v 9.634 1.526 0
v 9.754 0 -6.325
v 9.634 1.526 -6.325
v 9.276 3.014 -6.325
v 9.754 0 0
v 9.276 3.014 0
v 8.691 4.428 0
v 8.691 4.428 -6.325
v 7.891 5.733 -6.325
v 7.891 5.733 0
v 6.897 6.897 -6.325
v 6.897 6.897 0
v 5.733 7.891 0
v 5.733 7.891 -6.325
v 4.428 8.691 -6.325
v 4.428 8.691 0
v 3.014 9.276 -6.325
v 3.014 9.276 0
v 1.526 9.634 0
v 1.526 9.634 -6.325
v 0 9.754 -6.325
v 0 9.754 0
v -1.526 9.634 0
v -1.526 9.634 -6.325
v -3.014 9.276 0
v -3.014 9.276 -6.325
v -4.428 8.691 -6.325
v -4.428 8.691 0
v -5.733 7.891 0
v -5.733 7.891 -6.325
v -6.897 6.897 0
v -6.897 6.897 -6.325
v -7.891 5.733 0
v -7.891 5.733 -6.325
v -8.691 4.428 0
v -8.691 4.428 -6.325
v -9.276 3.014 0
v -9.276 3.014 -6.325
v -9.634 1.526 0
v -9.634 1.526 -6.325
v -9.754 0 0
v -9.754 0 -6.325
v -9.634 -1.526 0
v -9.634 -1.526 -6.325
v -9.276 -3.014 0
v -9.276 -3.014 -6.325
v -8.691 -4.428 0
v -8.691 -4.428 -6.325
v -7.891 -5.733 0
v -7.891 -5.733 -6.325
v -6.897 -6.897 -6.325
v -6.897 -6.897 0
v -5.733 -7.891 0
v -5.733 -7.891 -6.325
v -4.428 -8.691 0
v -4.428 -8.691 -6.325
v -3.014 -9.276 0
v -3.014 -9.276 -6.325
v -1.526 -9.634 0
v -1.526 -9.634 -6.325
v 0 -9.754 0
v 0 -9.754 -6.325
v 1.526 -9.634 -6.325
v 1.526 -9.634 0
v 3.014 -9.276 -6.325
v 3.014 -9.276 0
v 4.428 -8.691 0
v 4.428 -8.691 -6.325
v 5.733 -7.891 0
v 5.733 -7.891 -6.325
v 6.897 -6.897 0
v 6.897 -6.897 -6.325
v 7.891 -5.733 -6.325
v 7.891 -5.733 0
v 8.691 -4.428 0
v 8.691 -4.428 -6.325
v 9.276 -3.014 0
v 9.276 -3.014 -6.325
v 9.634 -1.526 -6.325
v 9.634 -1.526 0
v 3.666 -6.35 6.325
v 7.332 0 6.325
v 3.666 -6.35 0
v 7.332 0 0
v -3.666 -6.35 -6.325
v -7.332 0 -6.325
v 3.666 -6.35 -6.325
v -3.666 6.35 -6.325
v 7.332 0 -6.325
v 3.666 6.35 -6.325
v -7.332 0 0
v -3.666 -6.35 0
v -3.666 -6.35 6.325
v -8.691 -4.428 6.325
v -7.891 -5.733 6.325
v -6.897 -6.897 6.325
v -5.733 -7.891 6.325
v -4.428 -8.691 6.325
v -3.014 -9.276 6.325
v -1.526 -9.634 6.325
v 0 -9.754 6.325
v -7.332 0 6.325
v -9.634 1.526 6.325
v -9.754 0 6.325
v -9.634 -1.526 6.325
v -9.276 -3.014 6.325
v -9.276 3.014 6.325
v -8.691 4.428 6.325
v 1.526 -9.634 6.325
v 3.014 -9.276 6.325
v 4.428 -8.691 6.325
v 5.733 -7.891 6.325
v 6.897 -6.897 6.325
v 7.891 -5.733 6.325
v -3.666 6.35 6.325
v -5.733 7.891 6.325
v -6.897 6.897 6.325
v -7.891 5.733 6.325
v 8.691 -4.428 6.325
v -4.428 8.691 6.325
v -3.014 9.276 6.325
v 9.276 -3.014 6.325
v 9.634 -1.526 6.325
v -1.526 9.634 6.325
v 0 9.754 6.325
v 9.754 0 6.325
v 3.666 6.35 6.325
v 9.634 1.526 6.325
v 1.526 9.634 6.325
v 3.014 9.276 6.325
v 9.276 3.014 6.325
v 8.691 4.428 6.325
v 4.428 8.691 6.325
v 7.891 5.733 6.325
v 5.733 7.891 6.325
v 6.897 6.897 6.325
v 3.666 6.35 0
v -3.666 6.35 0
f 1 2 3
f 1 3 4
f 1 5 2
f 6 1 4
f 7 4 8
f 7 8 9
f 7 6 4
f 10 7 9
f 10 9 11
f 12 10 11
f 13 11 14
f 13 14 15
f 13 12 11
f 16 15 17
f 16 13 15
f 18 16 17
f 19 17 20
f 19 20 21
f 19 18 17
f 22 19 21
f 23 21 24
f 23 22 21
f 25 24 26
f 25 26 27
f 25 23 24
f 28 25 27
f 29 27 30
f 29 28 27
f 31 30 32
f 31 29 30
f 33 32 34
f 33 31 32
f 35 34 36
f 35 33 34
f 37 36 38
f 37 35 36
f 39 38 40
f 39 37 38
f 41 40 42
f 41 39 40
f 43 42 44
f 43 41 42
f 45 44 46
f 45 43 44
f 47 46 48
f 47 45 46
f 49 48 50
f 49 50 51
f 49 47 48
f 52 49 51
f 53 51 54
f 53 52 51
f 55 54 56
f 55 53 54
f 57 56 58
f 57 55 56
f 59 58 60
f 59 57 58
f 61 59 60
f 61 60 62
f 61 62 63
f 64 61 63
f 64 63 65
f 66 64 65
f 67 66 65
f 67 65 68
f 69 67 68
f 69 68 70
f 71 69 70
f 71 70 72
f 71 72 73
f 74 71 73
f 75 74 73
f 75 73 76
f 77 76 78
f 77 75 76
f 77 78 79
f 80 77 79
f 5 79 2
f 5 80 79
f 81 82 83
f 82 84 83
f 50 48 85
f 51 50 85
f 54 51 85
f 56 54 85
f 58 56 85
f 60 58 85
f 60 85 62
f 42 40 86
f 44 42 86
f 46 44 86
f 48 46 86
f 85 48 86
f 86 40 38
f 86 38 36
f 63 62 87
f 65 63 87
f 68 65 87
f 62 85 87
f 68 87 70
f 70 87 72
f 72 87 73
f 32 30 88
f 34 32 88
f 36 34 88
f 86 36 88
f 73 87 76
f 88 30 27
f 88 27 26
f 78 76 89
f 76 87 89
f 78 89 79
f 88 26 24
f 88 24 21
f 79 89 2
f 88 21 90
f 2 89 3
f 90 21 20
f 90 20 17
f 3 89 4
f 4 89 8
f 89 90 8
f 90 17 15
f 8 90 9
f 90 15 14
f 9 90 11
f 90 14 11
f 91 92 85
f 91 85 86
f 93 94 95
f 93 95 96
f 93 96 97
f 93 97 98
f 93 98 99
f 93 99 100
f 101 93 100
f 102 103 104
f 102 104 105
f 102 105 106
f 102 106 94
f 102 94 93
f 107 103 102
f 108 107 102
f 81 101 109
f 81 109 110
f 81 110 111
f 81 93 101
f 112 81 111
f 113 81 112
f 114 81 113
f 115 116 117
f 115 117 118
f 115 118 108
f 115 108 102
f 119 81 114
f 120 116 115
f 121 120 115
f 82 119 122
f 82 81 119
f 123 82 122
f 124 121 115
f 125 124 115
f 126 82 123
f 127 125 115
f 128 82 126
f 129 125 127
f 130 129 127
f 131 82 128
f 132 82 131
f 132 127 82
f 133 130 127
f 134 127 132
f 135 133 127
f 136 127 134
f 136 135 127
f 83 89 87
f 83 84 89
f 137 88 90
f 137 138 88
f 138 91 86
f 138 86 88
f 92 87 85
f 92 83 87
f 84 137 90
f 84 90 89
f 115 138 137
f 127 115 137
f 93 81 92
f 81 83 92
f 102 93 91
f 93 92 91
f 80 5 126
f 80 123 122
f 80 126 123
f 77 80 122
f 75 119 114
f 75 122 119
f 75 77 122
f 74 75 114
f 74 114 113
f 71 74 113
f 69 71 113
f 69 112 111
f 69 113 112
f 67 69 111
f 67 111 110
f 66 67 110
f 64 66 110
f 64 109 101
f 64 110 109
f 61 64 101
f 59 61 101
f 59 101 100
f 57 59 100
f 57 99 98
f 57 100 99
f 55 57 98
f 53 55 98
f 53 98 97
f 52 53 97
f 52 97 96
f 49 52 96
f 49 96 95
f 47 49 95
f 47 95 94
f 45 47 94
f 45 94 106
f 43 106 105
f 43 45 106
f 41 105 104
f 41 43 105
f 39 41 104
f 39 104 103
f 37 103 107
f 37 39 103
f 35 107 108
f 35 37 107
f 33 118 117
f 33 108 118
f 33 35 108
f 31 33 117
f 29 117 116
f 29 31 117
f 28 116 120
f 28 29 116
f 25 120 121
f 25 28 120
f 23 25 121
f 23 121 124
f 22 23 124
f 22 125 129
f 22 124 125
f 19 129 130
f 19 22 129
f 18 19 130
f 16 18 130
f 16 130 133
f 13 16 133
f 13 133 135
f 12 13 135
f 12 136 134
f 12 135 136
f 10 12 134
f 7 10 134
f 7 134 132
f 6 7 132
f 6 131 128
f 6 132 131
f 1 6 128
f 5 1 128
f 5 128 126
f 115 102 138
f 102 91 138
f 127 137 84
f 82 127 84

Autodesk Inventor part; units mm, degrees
ref_plane "YZ Plane" through (0, 0, 0) normal (1, 0, 0) x (0, 1, 0)
ref_plane "XZ Plane" through (0, 0, 0) normal (0, 1, 0) x (-1, 0, 0)
ref_plane "XY Plane" through (0, 0, 0) normal (0, 0, 1) x (1, 0, 0)
sketch "Sketch1" plane through (0, 0, 0) normal (0, 0, 1) x (1, 0, 0)
  circle A0 centre (0, 0) radius 9.7536
  line L0 (7.3323, 0) -> (3.6662, -6.35)
  line L1 (3.6662, -6.35) -> (-3.6662, -6.35)
  line L2 (-3.6662, -6.35) -> (-7.3323, 0)
  line L3 (-7.3323, 0) -> (-3.6662, 6.35)
  line L4 (-3.6662, 6.35) -> (3.6662, 6.35)
  line L5 (3.6662, 6.35) -> (7.3323, 0)
  dimension "d1" = 19.5072
  dimension "d2" = 12.7
extrude "Extrusion1" add sketch "Sketch1" along normal mid plane 12.6492
properties part number "0.498 Spacer 0.5 Hex"
